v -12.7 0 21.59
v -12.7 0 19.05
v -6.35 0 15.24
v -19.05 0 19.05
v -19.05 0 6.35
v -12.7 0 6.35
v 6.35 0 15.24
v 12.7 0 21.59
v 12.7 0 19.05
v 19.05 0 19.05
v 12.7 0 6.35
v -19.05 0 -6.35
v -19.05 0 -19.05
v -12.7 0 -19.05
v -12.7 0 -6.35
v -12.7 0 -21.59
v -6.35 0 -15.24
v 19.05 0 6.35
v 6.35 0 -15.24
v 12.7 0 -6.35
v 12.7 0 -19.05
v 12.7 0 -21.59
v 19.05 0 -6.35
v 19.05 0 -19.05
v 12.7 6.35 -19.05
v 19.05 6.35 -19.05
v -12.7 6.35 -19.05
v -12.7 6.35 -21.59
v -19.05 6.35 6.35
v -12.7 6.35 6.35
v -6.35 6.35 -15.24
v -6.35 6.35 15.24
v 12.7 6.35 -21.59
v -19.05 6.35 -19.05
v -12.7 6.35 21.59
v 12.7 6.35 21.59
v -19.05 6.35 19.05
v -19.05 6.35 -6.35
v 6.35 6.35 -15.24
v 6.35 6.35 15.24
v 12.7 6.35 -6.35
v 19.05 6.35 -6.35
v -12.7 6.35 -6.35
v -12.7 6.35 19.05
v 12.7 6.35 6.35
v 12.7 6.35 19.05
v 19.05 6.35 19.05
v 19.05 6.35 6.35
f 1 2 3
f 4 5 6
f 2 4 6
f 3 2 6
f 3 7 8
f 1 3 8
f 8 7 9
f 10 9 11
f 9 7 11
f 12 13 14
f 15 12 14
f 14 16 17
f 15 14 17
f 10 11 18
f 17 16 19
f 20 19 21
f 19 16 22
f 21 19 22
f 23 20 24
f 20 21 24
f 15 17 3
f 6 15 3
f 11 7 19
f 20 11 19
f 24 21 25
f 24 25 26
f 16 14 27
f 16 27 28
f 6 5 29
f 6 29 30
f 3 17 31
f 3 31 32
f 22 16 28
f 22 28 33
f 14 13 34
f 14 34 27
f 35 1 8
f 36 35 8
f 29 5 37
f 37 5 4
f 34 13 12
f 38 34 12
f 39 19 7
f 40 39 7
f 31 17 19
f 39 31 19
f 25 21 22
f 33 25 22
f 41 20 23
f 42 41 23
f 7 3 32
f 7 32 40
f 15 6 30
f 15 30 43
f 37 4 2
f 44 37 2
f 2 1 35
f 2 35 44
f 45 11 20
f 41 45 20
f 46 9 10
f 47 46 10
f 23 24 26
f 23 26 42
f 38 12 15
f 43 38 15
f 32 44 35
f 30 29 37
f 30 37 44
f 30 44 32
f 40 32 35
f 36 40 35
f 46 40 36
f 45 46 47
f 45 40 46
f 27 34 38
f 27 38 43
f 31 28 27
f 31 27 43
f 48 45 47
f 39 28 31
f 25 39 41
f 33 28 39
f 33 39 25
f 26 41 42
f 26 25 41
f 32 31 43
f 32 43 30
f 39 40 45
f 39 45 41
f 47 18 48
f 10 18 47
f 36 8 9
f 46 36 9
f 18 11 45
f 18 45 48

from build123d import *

# Parameters (mm, degrees)
SKETCH1_W           = 25.4
SKETCH1_H           = 43.18
BOSS_EXTRUDE1_DEPTH = 6.35
SKETCH2_W           = 6.35
SKETCH2_H           = 12.7
BOSS_EXTRUDE2_DEPTH = 6.35
SKETCH3_W           = 12.7
SKETCH3_H           = 30.48
CUT_EXTRUDE1_DEPTH  = 30.484794386


with BuildPart() as part:
    # Sketch1 → Boss-Extrude1 (new body)
    with BuildSketch(Plane(origin=(0, 0, 0), x_dir=(1, 0, 0), z_dir=(0, 1, 0))):
        Rectangle(SKETCH1_W, SKETCH1_H)
    extrude(amount=BOSS_EXTRUDE1_DEPTH)

    # Sketch2 → Boss-Extrude2 (add)
    with BuildSketch(Plane.XZ):
        with Locations((-15.875, 12.7)):
            Rectangle(SKETCH2_W, SKETCH2_H)
        with Locations((15.875, 12.7)):
            Rectangle(SKETCH2_W, SKETCH2_H)
        with Locations((15.875, -12.7)):
            Rectangle(SKETCH2_W, SKETCH2_H)
        with Locations((-15.875, -12.7)):
            Rectangle(SKETCH2_W, SKETCH2_H)
    extrude(amount=-BOSS_EXTRUDE2_DEPTH)

    # Sketch3 → Cut-Extrude1 (cut, through all)
    with BuildSketch(Plane.XZ):
        Rectangle(SKETCH3_W, SKETCH3_H)
    extrude(amount=-CUT_EXTRUDE1_DEPTH, mode=Mode.SUBTRACT)


solid = part.part
